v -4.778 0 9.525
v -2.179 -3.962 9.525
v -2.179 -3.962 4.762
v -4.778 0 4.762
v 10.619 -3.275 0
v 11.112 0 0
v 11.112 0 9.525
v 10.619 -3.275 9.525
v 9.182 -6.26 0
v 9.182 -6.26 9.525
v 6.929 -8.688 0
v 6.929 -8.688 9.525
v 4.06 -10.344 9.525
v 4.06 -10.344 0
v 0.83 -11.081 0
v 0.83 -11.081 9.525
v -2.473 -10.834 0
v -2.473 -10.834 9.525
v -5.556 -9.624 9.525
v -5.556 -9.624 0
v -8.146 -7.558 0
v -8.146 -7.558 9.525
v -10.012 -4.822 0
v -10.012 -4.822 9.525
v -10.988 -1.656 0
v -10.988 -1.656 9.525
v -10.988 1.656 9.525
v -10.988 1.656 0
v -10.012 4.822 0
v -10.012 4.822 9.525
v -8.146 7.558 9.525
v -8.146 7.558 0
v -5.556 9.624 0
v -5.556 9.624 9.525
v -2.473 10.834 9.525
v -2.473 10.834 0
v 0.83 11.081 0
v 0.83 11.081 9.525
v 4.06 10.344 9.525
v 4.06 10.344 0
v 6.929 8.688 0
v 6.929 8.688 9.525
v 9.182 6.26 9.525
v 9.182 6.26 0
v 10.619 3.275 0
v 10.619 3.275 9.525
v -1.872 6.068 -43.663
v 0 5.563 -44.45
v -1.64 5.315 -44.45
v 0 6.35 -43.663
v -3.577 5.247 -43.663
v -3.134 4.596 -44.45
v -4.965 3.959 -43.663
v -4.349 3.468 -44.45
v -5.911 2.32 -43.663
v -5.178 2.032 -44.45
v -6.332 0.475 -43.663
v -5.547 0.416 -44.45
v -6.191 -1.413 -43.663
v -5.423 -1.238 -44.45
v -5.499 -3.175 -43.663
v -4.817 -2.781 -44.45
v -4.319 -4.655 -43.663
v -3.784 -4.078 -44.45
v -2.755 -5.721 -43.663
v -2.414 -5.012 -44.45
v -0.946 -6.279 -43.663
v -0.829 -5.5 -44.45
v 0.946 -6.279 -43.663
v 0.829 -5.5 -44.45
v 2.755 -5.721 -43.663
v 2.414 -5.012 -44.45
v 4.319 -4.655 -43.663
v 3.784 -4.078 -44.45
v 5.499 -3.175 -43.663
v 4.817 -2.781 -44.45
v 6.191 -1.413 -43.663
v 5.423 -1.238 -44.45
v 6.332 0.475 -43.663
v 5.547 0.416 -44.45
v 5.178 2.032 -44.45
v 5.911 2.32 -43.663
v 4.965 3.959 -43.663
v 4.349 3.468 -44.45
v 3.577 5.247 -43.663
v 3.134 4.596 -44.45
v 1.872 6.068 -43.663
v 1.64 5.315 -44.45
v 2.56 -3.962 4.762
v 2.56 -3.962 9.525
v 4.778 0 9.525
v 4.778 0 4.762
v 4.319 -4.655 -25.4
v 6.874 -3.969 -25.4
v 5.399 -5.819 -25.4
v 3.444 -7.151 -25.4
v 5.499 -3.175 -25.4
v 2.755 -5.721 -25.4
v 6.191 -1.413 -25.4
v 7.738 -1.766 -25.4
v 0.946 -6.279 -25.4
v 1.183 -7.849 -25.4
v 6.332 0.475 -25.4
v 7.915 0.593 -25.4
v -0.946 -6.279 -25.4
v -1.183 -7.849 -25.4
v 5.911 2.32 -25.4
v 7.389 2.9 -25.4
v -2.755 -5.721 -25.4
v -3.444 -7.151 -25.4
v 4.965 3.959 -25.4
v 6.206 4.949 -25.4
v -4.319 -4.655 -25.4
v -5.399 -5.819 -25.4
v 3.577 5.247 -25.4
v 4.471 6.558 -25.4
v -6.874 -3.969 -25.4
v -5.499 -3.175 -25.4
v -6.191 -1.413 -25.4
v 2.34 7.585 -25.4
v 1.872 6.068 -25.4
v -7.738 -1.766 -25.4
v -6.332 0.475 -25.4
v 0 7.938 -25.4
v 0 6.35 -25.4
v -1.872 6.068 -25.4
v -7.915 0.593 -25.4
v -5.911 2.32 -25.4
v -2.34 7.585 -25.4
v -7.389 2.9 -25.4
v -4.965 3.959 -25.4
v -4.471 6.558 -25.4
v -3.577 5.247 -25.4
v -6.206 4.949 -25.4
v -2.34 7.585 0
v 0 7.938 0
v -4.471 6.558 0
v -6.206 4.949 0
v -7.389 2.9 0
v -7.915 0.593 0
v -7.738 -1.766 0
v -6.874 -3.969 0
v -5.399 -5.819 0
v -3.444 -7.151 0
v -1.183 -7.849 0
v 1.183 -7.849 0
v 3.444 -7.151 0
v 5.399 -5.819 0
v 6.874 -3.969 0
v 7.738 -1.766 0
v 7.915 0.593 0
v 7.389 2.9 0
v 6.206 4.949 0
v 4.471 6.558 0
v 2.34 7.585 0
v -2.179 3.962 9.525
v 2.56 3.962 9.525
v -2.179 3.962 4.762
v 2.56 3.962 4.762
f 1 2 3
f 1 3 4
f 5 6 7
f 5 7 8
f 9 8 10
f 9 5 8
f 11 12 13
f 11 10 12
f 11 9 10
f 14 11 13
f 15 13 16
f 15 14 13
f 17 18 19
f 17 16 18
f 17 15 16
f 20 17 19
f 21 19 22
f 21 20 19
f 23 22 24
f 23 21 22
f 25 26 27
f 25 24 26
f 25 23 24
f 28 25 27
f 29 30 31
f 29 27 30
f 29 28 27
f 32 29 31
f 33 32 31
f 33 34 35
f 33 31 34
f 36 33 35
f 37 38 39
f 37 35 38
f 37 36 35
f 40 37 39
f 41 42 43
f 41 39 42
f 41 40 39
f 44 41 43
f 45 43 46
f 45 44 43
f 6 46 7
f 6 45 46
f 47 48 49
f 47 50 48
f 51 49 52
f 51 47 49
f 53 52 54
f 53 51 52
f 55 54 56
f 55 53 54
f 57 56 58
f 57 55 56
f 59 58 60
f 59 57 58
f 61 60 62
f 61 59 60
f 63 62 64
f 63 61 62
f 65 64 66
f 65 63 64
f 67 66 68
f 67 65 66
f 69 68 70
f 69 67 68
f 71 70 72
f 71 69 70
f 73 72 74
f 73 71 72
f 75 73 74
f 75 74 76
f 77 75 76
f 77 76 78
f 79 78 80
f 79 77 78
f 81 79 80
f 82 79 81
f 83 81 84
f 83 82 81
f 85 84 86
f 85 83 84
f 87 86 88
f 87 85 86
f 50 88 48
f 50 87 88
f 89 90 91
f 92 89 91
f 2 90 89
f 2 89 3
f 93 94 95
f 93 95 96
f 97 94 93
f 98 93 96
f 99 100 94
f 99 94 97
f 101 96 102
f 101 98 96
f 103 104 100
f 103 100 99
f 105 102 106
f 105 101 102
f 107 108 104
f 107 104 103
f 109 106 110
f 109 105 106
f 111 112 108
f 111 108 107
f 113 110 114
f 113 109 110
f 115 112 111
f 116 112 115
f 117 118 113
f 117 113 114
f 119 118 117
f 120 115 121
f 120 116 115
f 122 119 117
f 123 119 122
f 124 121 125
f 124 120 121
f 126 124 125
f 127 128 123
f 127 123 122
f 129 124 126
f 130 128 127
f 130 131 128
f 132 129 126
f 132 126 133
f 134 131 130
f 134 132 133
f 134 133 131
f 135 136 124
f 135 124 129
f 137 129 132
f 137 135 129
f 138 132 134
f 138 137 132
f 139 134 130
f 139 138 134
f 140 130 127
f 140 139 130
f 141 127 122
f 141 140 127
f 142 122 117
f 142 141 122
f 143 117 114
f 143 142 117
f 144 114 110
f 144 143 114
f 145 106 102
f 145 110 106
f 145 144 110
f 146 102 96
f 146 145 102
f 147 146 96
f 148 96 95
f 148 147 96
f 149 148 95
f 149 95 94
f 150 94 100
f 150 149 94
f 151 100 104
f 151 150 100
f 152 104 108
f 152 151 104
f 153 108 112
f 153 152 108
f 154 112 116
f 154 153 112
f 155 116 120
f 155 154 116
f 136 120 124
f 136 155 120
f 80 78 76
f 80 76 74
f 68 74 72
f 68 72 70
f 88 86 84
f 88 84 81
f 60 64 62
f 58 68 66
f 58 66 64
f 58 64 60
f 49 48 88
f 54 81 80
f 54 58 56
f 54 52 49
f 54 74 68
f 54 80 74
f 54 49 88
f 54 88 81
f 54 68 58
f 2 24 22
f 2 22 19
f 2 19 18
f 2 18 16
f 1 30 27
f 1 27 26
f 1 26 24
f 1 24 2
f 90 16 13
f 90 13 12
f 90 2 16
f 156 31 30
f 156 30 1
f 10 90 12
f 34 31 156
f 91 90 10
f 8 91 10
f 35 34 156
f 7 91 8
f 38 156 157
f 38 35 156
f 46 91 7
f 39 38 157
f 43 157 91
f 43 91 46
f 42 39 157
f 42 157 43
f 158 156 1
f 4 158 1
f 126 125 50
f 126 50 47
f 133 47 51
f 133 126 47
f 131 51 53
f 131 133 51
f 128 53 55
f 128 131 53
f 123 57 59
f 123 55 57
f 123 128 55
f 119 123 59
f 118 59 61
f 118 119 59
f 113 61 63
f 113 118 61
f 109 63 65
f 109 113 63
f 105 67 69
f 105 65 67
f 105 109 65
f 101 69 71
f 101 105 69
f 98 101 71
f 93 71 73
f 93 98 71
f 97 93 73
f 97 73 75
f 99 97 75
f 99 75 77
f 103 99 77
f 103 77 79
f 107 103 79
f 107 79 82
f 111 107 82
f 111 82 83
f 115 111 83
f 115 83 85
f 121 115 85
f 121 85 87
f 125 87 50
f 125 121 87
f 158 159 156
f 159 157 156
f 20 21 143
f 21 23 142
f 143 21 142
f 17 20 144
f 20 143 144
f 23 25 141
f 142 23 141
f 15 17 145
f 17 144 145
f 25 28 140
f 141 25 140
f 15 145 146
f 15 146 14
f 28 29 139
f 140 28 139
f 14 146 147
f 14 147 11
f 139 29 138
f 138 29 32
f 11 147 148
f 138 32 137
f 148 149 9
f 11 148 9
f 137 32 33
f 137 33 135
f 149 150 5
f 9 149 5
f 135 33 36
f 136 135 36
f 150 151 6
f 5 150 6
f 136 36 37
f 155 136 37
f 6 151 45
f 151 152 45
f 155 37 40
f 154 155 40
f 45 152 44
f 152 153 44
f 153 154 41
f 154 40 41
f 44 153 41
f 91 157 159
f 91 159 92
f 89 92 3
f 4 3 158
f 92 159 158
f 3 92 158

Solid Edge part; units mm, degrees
sketch "Sketch1" plane through (0, 0, 0) normal (0, 0, 1) x (1, 0, 0)
  circle A0 centre (0, 0) radius 11.1125
  dimension "D1" = 22.225
extrude "Protrusion1" add sketch "Sketch1" along normal blind 9.525
sketch "Sketch2" plane through (0, 0, 0) normal (0, 0, -1) x (0, 1, 0)
  circle A0 centre (0, 0) radius 7.9375
  dimension "D1" = 15.875
extrude "Protrusion2" add sketch "Sketch2" along normal blind 25.4
sketch "Sketch3" plane through (0, 0, -25.4) normal (0, 0, -1) x (0, 1, 0)
  circle A0 centre (0, 0) radius 6.35
  dimension "D1" = 12.7
extrude "Protrusion3" add sketch "Sketch3" along normal blind 19.05
sketch "Sketch4" plane through (0, 0, 9.525) normal (0, 0, 1) x (0, 1, 0)
  line L0 (-3.9624, 2.1791) -> (0, 4.7782)
  line L1 (-3.9624, -2.5597) -> (-3.9624, 2.1791)
  line L2 (-3.9624, -2.5597) -> (0, -4.7782)
  line L3 (3.9624, -2.5597) -> (0, -4.7782)
  line L4 (3.9624, -2.5597) -> (3.9624, 2.1791)
  line L5 (3.9624, 2.1791) -> (0, 4.7782)
  dimension "D1" = 7.9248
extrude "Cutout1" cut sketch "Sketch4" against normal blind 4.7625
chamfer "Chamfer1" distance 0.7874 angle 45 1 edges at (0, -6.35, -44.45)
properties part number "24104361"
